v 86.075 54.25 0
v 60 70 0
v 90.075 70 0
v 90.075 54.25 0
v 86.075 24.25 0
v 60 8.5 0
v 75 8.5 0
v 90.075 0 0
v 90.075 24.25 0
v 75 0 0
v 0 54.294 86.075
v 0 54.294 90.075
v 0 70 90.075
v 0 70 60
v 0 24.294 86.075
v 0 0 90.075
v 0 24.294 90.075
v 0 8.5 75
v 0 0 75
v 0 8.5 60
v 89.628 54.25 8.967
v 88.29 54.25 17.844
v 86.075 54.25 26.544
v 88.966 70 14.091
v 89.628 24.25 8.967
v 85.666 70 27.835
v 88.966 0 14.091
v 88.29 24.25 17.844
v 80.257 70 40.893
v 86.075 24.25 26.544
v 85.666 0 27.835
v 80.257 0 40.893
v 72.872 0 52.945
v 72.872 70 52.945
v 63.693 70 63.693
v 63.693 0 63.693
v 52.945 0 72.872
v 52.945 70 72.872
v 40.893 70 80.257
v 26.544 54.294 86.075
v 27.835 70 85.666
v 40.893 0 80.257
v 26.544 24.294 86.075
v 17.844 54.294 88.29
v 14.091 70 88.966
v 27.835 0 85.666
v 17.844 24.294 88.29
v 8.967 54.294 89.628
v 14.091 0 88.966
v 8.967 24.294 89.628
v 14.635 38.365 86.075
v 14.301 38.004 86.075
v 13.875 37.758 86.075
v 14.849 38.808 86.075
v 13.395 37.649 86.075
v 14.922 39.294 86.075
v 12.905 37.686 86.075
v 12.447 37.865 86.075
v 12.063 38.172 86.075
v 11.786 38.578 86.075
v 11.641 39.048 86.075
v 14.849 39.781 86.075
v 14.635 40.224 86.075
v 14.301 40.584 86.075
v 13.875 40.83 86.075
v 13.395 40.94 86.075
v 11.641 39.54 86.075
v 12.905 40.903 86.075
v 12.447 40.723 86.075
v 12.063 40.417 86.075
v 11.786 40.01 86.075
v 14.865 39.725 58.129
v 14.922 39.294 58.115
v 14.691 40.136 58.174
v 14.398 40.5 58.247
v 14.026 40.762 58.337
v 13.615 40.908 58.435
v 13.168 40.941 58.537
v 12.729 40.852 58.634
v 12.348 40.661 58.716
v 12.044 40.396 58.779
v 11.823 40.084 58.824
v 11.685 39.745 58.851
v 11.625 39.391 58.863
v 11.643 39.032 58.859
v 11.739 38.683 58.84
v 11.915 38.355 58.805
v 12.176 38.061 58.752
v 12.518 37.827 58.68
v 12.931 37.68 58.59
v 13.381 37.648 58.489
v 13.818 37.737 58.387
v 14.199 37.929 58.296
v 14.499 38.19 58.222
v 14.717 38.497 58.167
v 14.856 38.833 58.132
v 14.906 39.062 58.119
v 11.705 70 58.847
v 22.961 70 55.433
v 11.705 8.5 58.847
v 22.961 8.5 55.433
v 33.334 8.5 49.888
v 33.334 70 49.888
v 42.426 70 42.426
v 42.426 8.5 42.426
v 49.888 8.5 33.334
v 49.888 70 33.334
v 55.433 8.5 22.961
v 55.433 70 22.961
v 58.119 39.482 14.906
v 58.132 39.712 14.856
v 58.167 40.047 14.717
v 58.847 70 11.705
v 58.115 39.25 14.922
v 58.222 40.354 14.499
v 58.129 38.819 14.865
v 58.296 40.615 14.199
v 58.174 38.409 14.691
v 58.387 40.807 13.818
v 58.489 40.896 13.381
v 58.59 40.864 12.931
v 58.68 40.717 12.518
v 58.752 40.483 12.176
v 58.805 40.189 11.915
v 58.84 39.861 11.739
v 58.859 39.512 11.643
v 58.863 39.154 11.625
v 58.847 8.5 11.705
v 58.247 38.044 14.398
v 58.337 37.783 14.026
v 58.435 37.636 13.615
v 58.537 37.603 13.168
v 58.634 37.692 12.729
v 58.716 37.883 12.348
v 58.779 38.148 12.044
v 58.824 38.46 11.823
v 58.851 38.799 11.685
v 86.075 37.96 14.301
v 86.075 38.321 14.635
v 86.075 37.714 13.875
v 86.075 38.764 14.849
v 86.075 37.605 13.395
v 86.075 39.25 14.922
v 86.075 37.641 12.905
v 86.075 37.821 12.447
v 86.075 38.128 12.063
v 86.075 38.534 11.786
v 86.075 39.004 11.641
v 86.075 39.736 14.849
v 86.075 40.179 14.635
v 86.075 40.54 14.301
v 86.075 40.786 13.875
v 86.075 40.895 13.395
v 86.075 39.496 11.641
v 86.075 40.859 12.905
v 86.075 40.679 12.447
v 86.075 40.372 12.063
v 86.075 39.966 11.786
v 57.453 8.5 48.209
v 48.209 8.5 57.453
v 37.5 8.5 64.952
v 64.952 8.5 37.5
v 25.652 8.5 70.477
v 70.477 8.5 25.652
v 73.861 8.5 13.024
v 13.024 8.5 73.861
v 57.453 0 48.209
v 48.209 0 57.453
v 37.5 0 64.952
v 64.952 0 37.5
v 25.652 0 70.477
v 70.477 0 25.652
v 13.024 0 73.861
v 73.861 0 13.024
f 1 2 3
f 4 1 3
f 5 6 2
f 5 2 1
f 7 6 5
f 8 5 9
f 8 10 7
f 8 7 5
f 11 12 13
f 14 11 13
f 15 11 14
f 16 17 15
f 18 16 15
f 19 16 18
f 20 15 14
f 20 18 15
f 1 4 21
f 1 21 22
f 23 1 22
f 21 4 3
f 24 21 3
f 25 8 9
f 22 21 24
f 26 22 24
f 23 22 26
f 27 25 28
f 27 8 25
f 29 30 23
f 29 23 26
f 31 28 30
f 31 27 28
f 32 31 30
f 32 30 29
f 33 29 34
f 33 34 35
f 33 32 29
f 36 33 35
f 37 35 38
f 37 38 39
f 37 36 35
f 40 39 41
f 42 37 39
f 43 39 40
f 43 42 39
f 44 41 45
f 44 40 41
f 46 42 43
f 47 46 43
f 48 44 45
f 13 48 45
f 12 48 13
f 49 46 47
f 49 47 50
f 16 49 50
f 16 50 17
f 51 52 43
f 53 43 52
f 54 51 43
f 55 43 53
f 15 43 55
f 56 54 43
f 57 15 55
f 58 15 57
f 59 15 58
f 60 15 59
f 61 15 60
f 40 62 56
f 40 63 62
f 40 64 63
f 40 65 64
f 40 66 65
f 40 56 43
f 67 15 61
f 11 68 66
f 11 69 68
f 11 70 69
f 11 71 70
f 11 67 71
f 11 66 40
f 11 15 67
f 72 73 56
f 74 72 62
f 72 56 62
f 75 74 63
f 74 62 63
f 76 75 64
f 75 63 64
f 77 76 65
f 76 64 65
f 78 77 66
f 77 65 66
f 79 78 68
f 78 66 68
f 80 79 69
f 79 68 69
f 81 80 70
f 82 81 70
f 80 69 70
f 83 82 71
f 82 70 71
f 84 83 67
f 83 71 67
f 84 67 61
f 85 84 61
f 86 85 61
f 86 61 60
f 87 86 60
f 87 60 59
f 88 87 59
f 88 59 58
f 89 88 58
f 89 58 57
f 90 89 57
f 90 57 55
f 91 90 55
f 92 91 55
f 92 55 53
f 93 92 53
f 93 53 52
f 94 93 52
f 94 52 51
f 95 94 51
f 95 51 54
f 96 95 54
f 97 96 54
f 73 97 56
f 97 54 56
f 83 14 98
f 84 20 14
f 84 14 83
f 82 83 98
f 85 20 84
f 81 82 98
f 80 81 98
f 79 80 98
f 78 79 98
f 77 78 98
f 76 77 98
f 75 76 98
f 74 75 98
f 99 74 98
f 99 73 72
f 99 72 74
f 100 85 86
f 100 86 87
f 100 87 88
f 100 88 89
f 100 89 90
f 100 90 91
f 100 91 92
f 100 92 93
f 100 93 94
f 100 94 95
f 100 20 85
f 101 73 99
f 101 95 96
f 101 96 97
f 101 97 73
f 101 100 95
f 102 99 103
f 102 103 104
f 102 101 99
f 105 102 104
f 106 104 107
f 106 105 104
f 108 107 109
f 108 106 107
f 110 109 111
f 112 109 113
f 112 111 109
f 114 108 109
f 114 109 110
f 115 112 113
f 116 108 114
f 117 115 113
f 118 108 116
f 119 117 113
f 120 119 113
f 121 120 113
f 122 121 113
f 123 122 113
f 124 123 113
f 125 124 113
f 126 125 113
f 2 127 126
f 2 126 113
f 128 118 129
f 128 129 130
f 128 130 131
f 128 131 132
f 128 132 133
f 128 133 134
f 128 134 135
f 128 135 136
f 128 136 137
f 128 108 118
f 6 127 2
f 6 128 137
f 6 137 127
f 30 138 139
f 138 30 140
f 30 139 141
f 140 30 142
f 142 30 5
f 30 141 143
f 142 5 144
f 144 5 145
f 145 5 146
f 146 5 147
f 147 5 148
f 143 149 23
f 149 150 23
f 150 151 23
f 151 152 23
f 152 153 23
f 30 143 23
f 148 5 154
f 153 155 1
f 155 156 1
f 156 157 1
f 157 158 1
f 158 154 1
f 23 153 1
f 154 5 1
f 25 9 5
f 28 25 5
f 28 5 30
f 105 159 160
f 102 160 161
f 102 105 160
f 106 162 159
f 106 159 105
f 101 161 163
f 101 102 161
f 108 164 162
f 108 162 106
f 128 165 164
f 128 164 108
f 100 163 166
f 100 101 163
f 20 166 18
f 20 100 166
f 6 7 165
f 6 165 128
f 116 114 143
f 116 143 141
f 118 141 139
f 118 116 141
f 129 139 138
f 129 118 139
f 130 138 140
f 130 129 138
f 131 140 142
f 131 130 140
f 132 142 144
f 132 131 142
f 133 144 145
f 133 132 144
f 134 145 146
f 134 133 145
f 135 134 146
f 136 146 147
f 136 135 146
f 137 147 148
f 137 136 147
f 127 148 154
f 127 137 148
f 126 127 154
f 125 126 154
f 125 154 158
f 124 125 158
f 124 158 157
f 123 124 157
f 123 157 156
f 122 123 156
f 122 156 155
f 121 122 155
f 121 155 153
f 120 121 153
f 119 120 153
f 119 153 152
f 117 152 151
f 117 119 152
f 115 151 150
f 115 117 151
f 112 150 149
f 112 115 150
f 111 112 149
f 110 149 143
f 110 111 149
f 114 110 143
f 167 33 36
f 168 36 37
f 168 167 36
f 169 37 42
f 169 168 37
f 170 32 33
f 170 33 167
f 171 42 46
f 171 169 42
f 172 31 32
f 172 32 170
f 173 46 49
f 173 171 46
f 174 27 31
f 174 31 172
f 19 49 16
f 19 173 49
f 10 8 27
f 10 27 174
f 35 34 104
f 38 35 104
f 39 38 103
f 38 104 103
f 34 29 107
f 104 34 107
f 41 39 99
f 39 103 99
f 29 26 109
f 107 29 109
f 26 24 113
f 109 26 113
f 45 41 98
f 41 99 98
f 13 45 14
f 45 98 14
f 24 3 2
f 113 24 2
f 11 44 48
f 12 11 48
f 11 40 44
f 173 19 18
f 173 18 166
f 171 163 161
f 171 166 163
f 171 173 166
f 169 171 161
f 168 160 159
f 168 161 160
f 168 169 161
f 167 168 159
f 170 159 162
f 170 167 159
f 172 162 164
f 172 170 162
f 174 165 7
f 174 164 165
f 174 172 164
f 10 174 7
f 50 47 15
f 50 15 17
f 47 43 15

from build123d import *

# Parameters (mm, degrees)
BASE_WALL_DEPTH     = 70
BASE_SUPPORT_START  = -61.5
BASE_SUPPORT_DEPTH  = 61.5
SKETCH4_W           = 8
SKETCH4_H           = 30
MOUNT_NOTCH_DEPTH   = 61.5
SKETCH5_R           = 1.65
SCREW_HOLE_M3_DEPTH = 181.5
SKETCH6_W           = 8
SKETCH6_H           = 30
CUT_EXTRUDE4_DEPTH  = 181.5
SKETCH7_R           = 1.65
CUT_EXTRUDE5_DEPTH  = 181.5


with BuildPart() as part:
    # Sketch1 → Base_Wall (new body)
    with BuildSketch(Plane(origin=(0, 0, 0), x_dir=(1, 0, 0), z_dir=(0, 1, 0))):
        with BuildLine():
            Line((75, 0), (90.075, 0))
            ThreePointArc((90.075, 0), (63.692643315, -63.692643315), (0, -90.075))
            Line((0, -90.075), (0, -75))
            ThreePointArc((0, -75), (53.033008589, -53.033008589), (75, 0))
        make_face()
    extrude(amount=BASE_WALL_DEPTH)

    # Sketch3 → Base_Support (add)
    with BuildSketch(Plane(origin=(0, 70, 0), x_dir=(1, 0, 0), z_dir=(0, 1, 0)).offset(BASE_SUPPORT_START)):
        with BuildLine():
            Line((0, -75), (0, -60))
            ThreePointArc((0, -60), (42.426406871, -42.426406871), (60, 0))
            Line((60, 0), (75, 0))
            ThreePointArc((75, 0), (53.033008589, -53.033008589), (0, -75))
        make_face()
    extrude(amount=BASE_SUPPORT_DEPTH)

    # Sketch4 → Mount-Notch (cut)
    with BuildSketch(Plane(origin=(0, 0, 0), x_dir=(-1, 0, 0), z_dir=(0, 0, -1))):
        with Locations((-90.075, 39.25)):
            Rectangle(SKETCH4_W, SKETCH4_H)
    extrude(amount=-MOUNT_NOTCH_DEPTH, mode=Mode.SUBTRACT)

    # Sketch5 → Screw-Hole-M3 (cut)
    with BuildSketch(Plane(origin=(0, 0, 0), x_dir=(0, 0, -1), z_dir=(1, 0, 0))):
        with Locations(Location((-13.272151295, 39.25, 0), (0, 0, 180))):
            Circle(SKETCH5_R)
    extrude(amount=SCREW_HOLE_M3_DEPTH, mode=Mode.SUBTRACT)

    # Sketch6 → Cut-Extrude4 (cut)
    with BuildSketch(Plane.ZY):
        with Locations((90.075, 39.294262642)):
            Rectangle(SKETCH6_W, SKETCH6_H)
    extrude(amount=-CUT_EXTRUDE4_DEPTH, mode=Mode.SUBTRACT)

    # Sketch7 → Cut-Extrude5 (cut)
    with BuildSketch(Plane.XY.offset(86.075)):
        with Locations((13.272151295, 39.294262642)):
            Circle(SKETCH7_R)
    extrude(amount=-CUT_EXTRUDE5_DEPTH, mode=Mode.SUBTRACT)


solid = part.part
